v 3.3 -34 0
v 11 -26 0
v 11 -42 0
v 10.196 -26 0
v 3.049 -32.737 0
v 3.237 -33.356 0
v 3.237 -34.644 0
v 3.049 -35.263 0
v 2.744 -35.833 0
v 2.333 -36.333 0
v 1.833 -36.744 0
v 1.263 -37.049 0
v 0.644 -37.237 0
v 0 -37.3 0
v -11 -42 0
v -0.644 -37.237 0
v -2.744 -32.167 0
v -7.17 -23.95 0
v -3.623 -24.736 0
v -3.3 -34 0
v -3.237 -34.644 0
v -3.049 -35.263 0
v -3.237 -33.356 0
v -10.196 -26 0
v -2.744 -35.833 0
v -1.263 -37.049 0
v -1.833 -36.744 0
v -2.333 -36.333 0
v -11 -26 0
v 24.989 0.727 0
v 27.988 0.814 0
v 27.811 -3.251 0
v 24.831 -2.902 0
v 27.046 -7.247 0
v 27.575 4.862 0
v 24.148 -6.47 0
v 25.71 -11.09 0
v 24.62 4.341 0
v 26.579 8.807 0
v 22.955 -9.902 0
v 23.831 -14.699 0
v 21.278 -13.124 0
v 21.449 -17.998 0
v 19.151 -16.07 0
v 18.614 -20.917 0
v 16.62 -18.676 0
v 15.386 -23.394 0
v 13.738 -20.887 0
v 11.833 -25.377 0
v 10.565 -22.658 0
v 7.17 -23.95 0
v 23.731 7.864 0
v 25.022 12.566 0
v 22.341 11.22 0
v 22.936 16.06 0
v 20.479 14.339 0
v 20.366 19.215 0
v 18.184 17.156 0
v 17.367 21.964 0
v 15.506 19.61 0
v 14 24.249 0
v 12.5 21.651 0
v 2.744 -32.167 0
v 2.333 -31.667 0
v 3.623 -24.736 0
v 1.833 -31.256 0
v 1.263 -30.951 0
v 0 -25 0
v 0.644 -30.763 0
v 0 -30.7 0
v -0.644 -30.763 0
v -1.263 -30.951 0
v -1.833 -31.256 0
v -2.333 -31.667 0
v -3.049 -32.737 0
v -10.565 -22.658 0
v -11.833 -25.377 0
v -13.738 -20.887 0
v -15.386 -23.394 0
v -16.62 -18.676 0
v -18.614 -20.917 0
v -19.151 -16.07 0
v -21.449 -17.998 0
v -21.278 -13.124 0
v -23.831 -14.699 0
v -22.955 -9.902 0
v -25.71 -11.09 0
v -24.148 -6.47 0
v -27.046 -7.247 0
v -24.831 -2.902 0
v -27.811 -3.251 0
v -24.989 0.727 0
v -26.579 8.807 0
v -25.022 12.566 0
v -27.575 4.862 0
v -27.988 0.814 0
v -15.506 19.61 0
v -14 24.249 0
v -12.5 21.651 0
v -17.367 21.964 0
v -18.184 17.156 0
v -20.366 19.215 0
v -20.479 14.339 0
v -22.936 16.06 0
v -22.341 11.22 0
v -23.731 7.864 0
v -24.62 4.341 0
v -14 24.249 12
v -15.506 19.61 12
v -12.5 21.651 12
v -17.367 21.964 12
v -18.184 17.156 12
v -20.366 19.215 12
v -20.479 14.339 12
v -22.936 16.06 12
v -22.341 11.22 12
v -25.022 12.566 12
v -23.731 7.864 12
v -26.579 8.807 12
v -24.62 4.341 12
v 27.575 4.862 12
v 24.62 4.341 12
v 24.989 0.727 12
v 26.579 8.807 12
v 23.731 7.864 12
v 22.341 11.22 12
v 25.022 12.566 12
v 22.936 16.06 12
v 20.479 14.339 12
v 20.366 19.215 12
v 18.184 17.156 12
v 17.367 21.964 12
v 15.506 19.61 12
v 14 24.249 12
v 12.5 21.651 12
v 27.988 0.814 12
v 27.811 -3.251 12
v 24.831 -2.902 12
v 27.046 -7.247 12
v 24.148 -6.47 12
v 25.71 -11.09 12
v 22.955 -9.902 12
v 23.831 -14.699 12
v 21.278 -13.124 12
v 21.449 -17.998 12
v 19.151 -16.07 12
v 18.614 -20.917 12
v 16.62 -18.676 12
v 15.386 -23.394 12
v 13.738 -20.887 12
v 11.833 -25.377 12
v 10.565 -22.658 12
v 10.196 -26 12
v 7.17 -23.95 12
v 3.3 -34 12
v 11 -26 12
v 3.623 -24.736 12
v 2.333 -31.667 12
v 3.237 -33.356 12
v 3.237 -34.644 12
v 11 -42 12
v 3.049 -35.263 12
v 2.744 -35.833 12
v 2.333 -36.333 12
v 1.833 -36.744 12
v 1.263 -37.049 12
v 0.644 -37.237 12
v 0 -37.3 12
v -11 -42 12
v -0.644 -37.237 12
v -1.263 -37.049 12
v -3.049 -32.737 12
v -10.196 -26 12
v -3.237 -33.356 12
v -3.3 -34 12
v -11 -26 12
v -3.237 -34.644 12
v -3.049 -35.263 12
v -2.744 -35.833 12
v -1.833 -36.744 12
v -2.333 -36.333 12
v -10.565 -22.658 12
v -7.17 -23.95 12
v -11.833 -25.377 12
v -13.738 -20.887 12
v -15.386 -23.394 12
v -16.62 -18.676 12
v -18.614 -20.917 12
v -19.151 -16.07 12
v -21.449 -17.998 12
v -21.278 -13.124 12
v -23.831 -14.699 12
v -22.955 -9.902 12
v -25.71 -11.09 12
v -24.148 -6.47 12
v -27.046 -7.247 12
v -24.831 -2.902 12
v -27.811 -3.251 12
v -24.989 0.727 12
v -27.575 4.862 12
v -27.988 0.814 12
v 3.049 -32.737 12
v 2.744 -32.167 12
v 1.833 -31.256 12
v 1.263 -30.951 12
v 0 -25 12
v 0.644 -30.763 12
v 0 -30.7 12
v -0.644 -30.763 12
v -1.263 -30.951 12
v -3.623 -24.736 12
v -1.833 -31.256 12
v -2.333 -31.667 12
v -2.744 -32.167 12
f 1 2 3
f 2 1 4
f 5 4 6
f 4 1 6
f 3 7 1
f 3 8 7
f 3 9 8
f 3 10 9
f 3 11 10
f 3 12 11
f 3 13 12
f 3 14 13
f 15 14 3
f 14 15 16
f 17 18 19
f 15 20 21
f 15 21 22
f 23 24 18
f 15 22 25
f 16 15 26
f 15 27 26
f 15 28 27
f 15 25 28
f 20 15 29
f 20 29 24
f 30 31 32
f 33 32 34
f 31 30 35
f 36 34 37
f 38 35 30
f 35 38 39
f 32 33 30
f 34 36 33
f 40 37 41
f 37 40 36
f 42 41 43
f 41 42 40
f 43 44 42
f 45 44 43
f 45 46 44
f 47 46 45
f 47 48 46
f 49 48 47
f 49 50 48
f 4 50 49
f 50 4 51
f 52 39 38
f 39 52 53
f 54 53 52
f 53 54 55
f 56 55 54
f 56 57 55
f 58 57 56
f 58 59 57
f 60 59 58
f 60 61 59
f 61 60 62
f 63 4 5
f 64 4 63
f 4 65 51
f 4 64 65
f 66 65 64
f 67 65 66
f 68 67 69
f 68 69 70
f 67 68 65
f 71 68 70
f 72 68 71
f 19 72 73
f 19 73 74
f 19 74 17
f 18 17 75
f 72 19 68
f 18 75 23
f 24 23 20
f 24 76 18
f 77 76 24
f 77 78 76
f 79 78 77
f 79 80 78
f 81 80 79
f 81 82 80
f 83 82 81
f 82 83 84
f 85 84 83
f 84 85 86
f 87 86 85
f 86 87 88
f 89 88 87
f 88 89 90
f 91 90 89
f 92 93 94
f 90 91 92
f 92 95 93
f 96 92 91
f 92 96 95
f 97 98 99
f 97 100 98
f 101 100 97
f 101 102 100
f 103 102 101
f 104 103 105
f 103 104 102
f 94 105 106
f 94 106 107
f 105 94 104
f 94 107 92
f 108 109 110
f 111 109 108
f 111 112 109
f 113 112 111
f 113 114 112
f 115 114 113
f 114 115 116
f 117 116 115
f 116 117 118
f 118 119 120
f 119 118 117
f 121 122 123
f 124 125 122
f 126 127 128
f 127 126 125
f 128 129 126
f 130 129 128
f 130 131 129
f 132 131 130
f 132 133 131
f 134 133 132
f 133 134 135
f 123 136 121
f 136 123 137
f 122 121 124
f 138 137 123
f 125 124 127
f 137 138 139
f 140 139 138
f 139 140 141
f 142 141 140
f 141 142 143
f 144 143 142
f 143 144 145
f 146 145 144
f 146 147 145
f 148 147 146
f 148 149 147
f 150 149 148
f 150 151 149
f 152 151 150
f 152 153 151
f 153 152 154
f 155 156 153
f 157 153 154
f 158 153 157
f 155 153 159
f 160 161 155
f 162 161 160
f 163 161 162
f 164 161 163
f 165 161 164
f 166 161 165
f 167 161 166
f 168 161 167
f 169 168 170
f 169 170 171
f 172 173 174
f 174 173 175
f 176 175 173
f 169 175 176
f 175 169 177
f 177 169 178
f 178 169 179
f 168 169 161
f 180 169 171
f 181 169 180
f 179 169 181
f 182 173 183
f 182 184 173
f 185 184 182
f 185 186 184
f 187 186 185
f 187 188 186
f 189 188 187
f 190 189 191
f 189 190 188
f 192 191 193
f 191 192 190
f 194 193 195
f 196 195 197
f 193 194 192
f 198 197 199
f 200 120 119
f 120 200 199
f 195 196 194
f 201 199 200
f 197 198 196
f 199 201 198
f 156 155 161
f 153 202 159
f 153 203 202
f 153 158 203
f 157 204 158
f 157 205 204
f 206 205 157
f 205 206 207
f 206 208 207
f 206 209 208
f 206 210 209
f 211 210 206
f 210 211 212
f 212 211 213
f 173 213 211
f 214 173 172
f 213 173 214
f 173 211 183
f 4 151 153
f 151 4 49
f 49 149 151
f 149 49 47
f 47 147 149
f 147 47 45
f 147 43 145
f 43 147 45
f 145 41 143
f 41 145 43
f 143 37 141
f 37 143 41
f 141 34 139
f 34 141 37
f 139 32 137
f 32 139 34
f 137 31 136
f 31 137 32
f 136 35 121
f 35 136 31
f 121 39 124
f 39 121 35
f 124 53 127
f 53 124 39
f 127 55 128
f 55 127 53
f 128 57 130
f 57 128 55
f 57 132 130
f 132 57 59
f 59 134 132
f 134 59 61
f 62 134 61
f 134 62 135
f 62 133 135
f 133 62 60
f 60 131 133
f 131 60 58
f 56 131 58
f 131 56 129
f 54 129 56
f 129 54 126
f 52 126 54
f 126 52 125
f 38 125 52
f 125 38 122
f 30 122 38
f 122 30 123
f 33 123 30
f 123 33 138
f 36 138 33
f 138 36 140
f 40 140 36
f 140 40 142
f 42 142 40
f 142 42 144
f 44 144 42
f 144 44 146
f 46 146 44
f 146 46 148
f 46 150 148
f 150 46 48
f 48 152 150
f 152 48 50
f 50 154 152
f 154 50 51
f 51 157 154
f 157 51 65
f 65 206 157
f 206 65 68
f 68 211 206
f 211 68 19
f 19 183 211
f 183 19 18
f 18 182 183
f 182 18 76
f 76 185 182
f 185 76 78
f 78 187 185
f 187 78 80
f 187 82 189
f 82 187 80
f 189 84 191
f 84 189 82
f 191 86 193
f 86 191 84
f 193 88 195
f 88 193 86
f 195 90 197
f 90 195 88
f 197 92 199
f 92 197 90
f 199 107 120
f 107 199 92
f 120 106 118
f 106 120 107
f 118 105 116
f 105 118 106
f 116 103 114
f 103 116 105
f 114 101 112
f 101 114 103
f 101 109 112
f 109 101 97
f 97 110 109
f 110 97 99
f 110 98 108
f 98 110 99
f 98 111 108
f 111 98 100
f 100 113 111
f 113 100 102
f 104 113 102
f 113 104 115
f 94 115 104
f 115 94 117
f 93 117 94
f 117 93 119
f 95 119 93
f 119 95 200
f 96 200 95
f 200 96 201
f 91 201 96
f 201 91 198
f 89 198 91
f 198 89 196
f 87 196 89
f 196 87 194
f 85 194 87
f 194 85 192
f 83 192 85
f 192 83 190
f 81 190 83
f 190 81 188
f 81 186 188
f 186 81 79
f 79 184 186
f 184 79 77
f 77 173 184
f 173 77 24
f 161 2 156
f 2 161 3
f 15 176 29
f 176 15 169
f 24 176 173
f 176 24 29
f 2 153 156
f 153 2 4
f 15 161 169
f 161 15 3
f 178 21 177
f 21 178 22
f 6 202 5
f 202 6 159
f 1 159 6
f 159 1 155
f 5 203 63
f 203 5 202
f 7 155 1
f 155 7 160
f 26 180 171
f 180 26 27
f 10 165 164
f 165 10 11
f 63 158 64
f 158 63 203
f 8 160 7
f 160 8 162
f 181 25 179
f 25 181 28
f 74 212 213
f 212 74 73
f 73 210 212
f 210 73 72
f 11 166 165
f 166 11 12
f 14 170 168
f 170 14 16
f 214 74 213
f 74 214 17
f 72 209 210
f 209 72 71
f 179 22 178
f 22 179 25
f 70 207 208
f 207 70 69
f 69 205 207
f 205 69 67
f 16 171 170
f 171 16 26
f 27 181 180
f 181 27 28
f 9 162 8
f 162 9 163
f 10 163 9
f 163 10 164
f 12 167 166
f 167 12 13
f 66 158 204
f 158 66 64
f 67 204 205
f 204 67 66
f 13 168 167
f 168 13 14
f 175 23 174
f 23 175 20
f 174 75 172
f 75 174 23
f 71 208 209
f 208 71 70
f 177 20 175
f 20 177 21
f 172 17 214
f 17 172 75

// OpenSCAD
$fn = 32;

// ----------------------------------------------------------------------
// Spring clip: 56 mm outside, 3 mm band, 60 degree opening
// ----------------------------------------------------------------------

// --- parameters (mm) ---
outer_r = 28;             // clip outside radius
inner_r = 25;             // clip bore radius
band = 3;                 // band thickness
clip_w = 12;              // clip width
opening = 60;             // opening angle
tab_w = 22;               // tab width
tab_len = 14;             // tab length past the clip
tab_hole = 6.6;           // tab fixing hole

clip_profile = [[-14, 24.249], [-17.367, 21.964], [-20.366, 19.215], [-22.936, 16.06], [-25.022, 12.566], [-26.579, 8.807], [-27.575, 4.862], [-27.988, 0.814], [-27.811, -3.251], [-27.046, -7.247], [-25.71, -11.09], [-23.831, -14.699], [-21.449, -17.998], [-18.614, -20.917], [-15.386, -23.394], [-11.833, -25.377], [-8.03, -26.824], [-4.058, -27.704], [0, -28], [4.058, -27.704], [8.03, -26.824], [11.833, -25.377], [15.386, -23.394], [18.614, -20.917], [21.449, -17.998], [23.831, -14.699], [25.71, -11.09], [27.046, -7.247], [27.811, -3.251], [27.988, 0.814], [27.575, 4.862], [26.579, 8.807], [25.022, 12.566], [22.936, 16.06], [20.366, 19.215], [17.367, 21.964], [14, 24.249], [12.5, 21.651], [15.506, 19.61], [18.184, 17.156], [20.479, 14.339], [22.341, 11.22], [23.731, 7.864], [24.62, 4.341], [24.989, 0.727], [24.831, -2.902], [24.148, -6.47], [22.955, -9.902], [21.278, -13.124], [19.151, -16.07], [16.62, -18.676], [13.738, -20.887], [10.565, -22.658], [7.17, -23.95], [3.623, -24.736], [0, -25], [-3.623, -24.736], [-7.17, -23.95], [-10.565, -22.658], [-13.738, -20.887], [-16.62, -18.676], [-19.151, -16.07], [-21.278, -13.124], [-22.955, -9.902], [-24.148, -6.47], [-24.831, -2.902], [-24.989, 0.727], [-24.62, 4.341], [-23.731, 7.864], [-22.341, 11.22], [-20.479, 14.339], [-18.184, 17.156], [-15.506, 19.61], [-12.5, 21.651]];

difference() {
  union() {
    linear_extrude(height = clip_w) polygon(clip_profile);
    /* mounting tab, sunk 2 mm into the band */
    translate([-11, -42, 0]) cube([tab_w, 16, clip_w]);
  }
  translate([0, -34, -2.5]) cylinder(h = clip_w + 5, d = tab_hole);
}
